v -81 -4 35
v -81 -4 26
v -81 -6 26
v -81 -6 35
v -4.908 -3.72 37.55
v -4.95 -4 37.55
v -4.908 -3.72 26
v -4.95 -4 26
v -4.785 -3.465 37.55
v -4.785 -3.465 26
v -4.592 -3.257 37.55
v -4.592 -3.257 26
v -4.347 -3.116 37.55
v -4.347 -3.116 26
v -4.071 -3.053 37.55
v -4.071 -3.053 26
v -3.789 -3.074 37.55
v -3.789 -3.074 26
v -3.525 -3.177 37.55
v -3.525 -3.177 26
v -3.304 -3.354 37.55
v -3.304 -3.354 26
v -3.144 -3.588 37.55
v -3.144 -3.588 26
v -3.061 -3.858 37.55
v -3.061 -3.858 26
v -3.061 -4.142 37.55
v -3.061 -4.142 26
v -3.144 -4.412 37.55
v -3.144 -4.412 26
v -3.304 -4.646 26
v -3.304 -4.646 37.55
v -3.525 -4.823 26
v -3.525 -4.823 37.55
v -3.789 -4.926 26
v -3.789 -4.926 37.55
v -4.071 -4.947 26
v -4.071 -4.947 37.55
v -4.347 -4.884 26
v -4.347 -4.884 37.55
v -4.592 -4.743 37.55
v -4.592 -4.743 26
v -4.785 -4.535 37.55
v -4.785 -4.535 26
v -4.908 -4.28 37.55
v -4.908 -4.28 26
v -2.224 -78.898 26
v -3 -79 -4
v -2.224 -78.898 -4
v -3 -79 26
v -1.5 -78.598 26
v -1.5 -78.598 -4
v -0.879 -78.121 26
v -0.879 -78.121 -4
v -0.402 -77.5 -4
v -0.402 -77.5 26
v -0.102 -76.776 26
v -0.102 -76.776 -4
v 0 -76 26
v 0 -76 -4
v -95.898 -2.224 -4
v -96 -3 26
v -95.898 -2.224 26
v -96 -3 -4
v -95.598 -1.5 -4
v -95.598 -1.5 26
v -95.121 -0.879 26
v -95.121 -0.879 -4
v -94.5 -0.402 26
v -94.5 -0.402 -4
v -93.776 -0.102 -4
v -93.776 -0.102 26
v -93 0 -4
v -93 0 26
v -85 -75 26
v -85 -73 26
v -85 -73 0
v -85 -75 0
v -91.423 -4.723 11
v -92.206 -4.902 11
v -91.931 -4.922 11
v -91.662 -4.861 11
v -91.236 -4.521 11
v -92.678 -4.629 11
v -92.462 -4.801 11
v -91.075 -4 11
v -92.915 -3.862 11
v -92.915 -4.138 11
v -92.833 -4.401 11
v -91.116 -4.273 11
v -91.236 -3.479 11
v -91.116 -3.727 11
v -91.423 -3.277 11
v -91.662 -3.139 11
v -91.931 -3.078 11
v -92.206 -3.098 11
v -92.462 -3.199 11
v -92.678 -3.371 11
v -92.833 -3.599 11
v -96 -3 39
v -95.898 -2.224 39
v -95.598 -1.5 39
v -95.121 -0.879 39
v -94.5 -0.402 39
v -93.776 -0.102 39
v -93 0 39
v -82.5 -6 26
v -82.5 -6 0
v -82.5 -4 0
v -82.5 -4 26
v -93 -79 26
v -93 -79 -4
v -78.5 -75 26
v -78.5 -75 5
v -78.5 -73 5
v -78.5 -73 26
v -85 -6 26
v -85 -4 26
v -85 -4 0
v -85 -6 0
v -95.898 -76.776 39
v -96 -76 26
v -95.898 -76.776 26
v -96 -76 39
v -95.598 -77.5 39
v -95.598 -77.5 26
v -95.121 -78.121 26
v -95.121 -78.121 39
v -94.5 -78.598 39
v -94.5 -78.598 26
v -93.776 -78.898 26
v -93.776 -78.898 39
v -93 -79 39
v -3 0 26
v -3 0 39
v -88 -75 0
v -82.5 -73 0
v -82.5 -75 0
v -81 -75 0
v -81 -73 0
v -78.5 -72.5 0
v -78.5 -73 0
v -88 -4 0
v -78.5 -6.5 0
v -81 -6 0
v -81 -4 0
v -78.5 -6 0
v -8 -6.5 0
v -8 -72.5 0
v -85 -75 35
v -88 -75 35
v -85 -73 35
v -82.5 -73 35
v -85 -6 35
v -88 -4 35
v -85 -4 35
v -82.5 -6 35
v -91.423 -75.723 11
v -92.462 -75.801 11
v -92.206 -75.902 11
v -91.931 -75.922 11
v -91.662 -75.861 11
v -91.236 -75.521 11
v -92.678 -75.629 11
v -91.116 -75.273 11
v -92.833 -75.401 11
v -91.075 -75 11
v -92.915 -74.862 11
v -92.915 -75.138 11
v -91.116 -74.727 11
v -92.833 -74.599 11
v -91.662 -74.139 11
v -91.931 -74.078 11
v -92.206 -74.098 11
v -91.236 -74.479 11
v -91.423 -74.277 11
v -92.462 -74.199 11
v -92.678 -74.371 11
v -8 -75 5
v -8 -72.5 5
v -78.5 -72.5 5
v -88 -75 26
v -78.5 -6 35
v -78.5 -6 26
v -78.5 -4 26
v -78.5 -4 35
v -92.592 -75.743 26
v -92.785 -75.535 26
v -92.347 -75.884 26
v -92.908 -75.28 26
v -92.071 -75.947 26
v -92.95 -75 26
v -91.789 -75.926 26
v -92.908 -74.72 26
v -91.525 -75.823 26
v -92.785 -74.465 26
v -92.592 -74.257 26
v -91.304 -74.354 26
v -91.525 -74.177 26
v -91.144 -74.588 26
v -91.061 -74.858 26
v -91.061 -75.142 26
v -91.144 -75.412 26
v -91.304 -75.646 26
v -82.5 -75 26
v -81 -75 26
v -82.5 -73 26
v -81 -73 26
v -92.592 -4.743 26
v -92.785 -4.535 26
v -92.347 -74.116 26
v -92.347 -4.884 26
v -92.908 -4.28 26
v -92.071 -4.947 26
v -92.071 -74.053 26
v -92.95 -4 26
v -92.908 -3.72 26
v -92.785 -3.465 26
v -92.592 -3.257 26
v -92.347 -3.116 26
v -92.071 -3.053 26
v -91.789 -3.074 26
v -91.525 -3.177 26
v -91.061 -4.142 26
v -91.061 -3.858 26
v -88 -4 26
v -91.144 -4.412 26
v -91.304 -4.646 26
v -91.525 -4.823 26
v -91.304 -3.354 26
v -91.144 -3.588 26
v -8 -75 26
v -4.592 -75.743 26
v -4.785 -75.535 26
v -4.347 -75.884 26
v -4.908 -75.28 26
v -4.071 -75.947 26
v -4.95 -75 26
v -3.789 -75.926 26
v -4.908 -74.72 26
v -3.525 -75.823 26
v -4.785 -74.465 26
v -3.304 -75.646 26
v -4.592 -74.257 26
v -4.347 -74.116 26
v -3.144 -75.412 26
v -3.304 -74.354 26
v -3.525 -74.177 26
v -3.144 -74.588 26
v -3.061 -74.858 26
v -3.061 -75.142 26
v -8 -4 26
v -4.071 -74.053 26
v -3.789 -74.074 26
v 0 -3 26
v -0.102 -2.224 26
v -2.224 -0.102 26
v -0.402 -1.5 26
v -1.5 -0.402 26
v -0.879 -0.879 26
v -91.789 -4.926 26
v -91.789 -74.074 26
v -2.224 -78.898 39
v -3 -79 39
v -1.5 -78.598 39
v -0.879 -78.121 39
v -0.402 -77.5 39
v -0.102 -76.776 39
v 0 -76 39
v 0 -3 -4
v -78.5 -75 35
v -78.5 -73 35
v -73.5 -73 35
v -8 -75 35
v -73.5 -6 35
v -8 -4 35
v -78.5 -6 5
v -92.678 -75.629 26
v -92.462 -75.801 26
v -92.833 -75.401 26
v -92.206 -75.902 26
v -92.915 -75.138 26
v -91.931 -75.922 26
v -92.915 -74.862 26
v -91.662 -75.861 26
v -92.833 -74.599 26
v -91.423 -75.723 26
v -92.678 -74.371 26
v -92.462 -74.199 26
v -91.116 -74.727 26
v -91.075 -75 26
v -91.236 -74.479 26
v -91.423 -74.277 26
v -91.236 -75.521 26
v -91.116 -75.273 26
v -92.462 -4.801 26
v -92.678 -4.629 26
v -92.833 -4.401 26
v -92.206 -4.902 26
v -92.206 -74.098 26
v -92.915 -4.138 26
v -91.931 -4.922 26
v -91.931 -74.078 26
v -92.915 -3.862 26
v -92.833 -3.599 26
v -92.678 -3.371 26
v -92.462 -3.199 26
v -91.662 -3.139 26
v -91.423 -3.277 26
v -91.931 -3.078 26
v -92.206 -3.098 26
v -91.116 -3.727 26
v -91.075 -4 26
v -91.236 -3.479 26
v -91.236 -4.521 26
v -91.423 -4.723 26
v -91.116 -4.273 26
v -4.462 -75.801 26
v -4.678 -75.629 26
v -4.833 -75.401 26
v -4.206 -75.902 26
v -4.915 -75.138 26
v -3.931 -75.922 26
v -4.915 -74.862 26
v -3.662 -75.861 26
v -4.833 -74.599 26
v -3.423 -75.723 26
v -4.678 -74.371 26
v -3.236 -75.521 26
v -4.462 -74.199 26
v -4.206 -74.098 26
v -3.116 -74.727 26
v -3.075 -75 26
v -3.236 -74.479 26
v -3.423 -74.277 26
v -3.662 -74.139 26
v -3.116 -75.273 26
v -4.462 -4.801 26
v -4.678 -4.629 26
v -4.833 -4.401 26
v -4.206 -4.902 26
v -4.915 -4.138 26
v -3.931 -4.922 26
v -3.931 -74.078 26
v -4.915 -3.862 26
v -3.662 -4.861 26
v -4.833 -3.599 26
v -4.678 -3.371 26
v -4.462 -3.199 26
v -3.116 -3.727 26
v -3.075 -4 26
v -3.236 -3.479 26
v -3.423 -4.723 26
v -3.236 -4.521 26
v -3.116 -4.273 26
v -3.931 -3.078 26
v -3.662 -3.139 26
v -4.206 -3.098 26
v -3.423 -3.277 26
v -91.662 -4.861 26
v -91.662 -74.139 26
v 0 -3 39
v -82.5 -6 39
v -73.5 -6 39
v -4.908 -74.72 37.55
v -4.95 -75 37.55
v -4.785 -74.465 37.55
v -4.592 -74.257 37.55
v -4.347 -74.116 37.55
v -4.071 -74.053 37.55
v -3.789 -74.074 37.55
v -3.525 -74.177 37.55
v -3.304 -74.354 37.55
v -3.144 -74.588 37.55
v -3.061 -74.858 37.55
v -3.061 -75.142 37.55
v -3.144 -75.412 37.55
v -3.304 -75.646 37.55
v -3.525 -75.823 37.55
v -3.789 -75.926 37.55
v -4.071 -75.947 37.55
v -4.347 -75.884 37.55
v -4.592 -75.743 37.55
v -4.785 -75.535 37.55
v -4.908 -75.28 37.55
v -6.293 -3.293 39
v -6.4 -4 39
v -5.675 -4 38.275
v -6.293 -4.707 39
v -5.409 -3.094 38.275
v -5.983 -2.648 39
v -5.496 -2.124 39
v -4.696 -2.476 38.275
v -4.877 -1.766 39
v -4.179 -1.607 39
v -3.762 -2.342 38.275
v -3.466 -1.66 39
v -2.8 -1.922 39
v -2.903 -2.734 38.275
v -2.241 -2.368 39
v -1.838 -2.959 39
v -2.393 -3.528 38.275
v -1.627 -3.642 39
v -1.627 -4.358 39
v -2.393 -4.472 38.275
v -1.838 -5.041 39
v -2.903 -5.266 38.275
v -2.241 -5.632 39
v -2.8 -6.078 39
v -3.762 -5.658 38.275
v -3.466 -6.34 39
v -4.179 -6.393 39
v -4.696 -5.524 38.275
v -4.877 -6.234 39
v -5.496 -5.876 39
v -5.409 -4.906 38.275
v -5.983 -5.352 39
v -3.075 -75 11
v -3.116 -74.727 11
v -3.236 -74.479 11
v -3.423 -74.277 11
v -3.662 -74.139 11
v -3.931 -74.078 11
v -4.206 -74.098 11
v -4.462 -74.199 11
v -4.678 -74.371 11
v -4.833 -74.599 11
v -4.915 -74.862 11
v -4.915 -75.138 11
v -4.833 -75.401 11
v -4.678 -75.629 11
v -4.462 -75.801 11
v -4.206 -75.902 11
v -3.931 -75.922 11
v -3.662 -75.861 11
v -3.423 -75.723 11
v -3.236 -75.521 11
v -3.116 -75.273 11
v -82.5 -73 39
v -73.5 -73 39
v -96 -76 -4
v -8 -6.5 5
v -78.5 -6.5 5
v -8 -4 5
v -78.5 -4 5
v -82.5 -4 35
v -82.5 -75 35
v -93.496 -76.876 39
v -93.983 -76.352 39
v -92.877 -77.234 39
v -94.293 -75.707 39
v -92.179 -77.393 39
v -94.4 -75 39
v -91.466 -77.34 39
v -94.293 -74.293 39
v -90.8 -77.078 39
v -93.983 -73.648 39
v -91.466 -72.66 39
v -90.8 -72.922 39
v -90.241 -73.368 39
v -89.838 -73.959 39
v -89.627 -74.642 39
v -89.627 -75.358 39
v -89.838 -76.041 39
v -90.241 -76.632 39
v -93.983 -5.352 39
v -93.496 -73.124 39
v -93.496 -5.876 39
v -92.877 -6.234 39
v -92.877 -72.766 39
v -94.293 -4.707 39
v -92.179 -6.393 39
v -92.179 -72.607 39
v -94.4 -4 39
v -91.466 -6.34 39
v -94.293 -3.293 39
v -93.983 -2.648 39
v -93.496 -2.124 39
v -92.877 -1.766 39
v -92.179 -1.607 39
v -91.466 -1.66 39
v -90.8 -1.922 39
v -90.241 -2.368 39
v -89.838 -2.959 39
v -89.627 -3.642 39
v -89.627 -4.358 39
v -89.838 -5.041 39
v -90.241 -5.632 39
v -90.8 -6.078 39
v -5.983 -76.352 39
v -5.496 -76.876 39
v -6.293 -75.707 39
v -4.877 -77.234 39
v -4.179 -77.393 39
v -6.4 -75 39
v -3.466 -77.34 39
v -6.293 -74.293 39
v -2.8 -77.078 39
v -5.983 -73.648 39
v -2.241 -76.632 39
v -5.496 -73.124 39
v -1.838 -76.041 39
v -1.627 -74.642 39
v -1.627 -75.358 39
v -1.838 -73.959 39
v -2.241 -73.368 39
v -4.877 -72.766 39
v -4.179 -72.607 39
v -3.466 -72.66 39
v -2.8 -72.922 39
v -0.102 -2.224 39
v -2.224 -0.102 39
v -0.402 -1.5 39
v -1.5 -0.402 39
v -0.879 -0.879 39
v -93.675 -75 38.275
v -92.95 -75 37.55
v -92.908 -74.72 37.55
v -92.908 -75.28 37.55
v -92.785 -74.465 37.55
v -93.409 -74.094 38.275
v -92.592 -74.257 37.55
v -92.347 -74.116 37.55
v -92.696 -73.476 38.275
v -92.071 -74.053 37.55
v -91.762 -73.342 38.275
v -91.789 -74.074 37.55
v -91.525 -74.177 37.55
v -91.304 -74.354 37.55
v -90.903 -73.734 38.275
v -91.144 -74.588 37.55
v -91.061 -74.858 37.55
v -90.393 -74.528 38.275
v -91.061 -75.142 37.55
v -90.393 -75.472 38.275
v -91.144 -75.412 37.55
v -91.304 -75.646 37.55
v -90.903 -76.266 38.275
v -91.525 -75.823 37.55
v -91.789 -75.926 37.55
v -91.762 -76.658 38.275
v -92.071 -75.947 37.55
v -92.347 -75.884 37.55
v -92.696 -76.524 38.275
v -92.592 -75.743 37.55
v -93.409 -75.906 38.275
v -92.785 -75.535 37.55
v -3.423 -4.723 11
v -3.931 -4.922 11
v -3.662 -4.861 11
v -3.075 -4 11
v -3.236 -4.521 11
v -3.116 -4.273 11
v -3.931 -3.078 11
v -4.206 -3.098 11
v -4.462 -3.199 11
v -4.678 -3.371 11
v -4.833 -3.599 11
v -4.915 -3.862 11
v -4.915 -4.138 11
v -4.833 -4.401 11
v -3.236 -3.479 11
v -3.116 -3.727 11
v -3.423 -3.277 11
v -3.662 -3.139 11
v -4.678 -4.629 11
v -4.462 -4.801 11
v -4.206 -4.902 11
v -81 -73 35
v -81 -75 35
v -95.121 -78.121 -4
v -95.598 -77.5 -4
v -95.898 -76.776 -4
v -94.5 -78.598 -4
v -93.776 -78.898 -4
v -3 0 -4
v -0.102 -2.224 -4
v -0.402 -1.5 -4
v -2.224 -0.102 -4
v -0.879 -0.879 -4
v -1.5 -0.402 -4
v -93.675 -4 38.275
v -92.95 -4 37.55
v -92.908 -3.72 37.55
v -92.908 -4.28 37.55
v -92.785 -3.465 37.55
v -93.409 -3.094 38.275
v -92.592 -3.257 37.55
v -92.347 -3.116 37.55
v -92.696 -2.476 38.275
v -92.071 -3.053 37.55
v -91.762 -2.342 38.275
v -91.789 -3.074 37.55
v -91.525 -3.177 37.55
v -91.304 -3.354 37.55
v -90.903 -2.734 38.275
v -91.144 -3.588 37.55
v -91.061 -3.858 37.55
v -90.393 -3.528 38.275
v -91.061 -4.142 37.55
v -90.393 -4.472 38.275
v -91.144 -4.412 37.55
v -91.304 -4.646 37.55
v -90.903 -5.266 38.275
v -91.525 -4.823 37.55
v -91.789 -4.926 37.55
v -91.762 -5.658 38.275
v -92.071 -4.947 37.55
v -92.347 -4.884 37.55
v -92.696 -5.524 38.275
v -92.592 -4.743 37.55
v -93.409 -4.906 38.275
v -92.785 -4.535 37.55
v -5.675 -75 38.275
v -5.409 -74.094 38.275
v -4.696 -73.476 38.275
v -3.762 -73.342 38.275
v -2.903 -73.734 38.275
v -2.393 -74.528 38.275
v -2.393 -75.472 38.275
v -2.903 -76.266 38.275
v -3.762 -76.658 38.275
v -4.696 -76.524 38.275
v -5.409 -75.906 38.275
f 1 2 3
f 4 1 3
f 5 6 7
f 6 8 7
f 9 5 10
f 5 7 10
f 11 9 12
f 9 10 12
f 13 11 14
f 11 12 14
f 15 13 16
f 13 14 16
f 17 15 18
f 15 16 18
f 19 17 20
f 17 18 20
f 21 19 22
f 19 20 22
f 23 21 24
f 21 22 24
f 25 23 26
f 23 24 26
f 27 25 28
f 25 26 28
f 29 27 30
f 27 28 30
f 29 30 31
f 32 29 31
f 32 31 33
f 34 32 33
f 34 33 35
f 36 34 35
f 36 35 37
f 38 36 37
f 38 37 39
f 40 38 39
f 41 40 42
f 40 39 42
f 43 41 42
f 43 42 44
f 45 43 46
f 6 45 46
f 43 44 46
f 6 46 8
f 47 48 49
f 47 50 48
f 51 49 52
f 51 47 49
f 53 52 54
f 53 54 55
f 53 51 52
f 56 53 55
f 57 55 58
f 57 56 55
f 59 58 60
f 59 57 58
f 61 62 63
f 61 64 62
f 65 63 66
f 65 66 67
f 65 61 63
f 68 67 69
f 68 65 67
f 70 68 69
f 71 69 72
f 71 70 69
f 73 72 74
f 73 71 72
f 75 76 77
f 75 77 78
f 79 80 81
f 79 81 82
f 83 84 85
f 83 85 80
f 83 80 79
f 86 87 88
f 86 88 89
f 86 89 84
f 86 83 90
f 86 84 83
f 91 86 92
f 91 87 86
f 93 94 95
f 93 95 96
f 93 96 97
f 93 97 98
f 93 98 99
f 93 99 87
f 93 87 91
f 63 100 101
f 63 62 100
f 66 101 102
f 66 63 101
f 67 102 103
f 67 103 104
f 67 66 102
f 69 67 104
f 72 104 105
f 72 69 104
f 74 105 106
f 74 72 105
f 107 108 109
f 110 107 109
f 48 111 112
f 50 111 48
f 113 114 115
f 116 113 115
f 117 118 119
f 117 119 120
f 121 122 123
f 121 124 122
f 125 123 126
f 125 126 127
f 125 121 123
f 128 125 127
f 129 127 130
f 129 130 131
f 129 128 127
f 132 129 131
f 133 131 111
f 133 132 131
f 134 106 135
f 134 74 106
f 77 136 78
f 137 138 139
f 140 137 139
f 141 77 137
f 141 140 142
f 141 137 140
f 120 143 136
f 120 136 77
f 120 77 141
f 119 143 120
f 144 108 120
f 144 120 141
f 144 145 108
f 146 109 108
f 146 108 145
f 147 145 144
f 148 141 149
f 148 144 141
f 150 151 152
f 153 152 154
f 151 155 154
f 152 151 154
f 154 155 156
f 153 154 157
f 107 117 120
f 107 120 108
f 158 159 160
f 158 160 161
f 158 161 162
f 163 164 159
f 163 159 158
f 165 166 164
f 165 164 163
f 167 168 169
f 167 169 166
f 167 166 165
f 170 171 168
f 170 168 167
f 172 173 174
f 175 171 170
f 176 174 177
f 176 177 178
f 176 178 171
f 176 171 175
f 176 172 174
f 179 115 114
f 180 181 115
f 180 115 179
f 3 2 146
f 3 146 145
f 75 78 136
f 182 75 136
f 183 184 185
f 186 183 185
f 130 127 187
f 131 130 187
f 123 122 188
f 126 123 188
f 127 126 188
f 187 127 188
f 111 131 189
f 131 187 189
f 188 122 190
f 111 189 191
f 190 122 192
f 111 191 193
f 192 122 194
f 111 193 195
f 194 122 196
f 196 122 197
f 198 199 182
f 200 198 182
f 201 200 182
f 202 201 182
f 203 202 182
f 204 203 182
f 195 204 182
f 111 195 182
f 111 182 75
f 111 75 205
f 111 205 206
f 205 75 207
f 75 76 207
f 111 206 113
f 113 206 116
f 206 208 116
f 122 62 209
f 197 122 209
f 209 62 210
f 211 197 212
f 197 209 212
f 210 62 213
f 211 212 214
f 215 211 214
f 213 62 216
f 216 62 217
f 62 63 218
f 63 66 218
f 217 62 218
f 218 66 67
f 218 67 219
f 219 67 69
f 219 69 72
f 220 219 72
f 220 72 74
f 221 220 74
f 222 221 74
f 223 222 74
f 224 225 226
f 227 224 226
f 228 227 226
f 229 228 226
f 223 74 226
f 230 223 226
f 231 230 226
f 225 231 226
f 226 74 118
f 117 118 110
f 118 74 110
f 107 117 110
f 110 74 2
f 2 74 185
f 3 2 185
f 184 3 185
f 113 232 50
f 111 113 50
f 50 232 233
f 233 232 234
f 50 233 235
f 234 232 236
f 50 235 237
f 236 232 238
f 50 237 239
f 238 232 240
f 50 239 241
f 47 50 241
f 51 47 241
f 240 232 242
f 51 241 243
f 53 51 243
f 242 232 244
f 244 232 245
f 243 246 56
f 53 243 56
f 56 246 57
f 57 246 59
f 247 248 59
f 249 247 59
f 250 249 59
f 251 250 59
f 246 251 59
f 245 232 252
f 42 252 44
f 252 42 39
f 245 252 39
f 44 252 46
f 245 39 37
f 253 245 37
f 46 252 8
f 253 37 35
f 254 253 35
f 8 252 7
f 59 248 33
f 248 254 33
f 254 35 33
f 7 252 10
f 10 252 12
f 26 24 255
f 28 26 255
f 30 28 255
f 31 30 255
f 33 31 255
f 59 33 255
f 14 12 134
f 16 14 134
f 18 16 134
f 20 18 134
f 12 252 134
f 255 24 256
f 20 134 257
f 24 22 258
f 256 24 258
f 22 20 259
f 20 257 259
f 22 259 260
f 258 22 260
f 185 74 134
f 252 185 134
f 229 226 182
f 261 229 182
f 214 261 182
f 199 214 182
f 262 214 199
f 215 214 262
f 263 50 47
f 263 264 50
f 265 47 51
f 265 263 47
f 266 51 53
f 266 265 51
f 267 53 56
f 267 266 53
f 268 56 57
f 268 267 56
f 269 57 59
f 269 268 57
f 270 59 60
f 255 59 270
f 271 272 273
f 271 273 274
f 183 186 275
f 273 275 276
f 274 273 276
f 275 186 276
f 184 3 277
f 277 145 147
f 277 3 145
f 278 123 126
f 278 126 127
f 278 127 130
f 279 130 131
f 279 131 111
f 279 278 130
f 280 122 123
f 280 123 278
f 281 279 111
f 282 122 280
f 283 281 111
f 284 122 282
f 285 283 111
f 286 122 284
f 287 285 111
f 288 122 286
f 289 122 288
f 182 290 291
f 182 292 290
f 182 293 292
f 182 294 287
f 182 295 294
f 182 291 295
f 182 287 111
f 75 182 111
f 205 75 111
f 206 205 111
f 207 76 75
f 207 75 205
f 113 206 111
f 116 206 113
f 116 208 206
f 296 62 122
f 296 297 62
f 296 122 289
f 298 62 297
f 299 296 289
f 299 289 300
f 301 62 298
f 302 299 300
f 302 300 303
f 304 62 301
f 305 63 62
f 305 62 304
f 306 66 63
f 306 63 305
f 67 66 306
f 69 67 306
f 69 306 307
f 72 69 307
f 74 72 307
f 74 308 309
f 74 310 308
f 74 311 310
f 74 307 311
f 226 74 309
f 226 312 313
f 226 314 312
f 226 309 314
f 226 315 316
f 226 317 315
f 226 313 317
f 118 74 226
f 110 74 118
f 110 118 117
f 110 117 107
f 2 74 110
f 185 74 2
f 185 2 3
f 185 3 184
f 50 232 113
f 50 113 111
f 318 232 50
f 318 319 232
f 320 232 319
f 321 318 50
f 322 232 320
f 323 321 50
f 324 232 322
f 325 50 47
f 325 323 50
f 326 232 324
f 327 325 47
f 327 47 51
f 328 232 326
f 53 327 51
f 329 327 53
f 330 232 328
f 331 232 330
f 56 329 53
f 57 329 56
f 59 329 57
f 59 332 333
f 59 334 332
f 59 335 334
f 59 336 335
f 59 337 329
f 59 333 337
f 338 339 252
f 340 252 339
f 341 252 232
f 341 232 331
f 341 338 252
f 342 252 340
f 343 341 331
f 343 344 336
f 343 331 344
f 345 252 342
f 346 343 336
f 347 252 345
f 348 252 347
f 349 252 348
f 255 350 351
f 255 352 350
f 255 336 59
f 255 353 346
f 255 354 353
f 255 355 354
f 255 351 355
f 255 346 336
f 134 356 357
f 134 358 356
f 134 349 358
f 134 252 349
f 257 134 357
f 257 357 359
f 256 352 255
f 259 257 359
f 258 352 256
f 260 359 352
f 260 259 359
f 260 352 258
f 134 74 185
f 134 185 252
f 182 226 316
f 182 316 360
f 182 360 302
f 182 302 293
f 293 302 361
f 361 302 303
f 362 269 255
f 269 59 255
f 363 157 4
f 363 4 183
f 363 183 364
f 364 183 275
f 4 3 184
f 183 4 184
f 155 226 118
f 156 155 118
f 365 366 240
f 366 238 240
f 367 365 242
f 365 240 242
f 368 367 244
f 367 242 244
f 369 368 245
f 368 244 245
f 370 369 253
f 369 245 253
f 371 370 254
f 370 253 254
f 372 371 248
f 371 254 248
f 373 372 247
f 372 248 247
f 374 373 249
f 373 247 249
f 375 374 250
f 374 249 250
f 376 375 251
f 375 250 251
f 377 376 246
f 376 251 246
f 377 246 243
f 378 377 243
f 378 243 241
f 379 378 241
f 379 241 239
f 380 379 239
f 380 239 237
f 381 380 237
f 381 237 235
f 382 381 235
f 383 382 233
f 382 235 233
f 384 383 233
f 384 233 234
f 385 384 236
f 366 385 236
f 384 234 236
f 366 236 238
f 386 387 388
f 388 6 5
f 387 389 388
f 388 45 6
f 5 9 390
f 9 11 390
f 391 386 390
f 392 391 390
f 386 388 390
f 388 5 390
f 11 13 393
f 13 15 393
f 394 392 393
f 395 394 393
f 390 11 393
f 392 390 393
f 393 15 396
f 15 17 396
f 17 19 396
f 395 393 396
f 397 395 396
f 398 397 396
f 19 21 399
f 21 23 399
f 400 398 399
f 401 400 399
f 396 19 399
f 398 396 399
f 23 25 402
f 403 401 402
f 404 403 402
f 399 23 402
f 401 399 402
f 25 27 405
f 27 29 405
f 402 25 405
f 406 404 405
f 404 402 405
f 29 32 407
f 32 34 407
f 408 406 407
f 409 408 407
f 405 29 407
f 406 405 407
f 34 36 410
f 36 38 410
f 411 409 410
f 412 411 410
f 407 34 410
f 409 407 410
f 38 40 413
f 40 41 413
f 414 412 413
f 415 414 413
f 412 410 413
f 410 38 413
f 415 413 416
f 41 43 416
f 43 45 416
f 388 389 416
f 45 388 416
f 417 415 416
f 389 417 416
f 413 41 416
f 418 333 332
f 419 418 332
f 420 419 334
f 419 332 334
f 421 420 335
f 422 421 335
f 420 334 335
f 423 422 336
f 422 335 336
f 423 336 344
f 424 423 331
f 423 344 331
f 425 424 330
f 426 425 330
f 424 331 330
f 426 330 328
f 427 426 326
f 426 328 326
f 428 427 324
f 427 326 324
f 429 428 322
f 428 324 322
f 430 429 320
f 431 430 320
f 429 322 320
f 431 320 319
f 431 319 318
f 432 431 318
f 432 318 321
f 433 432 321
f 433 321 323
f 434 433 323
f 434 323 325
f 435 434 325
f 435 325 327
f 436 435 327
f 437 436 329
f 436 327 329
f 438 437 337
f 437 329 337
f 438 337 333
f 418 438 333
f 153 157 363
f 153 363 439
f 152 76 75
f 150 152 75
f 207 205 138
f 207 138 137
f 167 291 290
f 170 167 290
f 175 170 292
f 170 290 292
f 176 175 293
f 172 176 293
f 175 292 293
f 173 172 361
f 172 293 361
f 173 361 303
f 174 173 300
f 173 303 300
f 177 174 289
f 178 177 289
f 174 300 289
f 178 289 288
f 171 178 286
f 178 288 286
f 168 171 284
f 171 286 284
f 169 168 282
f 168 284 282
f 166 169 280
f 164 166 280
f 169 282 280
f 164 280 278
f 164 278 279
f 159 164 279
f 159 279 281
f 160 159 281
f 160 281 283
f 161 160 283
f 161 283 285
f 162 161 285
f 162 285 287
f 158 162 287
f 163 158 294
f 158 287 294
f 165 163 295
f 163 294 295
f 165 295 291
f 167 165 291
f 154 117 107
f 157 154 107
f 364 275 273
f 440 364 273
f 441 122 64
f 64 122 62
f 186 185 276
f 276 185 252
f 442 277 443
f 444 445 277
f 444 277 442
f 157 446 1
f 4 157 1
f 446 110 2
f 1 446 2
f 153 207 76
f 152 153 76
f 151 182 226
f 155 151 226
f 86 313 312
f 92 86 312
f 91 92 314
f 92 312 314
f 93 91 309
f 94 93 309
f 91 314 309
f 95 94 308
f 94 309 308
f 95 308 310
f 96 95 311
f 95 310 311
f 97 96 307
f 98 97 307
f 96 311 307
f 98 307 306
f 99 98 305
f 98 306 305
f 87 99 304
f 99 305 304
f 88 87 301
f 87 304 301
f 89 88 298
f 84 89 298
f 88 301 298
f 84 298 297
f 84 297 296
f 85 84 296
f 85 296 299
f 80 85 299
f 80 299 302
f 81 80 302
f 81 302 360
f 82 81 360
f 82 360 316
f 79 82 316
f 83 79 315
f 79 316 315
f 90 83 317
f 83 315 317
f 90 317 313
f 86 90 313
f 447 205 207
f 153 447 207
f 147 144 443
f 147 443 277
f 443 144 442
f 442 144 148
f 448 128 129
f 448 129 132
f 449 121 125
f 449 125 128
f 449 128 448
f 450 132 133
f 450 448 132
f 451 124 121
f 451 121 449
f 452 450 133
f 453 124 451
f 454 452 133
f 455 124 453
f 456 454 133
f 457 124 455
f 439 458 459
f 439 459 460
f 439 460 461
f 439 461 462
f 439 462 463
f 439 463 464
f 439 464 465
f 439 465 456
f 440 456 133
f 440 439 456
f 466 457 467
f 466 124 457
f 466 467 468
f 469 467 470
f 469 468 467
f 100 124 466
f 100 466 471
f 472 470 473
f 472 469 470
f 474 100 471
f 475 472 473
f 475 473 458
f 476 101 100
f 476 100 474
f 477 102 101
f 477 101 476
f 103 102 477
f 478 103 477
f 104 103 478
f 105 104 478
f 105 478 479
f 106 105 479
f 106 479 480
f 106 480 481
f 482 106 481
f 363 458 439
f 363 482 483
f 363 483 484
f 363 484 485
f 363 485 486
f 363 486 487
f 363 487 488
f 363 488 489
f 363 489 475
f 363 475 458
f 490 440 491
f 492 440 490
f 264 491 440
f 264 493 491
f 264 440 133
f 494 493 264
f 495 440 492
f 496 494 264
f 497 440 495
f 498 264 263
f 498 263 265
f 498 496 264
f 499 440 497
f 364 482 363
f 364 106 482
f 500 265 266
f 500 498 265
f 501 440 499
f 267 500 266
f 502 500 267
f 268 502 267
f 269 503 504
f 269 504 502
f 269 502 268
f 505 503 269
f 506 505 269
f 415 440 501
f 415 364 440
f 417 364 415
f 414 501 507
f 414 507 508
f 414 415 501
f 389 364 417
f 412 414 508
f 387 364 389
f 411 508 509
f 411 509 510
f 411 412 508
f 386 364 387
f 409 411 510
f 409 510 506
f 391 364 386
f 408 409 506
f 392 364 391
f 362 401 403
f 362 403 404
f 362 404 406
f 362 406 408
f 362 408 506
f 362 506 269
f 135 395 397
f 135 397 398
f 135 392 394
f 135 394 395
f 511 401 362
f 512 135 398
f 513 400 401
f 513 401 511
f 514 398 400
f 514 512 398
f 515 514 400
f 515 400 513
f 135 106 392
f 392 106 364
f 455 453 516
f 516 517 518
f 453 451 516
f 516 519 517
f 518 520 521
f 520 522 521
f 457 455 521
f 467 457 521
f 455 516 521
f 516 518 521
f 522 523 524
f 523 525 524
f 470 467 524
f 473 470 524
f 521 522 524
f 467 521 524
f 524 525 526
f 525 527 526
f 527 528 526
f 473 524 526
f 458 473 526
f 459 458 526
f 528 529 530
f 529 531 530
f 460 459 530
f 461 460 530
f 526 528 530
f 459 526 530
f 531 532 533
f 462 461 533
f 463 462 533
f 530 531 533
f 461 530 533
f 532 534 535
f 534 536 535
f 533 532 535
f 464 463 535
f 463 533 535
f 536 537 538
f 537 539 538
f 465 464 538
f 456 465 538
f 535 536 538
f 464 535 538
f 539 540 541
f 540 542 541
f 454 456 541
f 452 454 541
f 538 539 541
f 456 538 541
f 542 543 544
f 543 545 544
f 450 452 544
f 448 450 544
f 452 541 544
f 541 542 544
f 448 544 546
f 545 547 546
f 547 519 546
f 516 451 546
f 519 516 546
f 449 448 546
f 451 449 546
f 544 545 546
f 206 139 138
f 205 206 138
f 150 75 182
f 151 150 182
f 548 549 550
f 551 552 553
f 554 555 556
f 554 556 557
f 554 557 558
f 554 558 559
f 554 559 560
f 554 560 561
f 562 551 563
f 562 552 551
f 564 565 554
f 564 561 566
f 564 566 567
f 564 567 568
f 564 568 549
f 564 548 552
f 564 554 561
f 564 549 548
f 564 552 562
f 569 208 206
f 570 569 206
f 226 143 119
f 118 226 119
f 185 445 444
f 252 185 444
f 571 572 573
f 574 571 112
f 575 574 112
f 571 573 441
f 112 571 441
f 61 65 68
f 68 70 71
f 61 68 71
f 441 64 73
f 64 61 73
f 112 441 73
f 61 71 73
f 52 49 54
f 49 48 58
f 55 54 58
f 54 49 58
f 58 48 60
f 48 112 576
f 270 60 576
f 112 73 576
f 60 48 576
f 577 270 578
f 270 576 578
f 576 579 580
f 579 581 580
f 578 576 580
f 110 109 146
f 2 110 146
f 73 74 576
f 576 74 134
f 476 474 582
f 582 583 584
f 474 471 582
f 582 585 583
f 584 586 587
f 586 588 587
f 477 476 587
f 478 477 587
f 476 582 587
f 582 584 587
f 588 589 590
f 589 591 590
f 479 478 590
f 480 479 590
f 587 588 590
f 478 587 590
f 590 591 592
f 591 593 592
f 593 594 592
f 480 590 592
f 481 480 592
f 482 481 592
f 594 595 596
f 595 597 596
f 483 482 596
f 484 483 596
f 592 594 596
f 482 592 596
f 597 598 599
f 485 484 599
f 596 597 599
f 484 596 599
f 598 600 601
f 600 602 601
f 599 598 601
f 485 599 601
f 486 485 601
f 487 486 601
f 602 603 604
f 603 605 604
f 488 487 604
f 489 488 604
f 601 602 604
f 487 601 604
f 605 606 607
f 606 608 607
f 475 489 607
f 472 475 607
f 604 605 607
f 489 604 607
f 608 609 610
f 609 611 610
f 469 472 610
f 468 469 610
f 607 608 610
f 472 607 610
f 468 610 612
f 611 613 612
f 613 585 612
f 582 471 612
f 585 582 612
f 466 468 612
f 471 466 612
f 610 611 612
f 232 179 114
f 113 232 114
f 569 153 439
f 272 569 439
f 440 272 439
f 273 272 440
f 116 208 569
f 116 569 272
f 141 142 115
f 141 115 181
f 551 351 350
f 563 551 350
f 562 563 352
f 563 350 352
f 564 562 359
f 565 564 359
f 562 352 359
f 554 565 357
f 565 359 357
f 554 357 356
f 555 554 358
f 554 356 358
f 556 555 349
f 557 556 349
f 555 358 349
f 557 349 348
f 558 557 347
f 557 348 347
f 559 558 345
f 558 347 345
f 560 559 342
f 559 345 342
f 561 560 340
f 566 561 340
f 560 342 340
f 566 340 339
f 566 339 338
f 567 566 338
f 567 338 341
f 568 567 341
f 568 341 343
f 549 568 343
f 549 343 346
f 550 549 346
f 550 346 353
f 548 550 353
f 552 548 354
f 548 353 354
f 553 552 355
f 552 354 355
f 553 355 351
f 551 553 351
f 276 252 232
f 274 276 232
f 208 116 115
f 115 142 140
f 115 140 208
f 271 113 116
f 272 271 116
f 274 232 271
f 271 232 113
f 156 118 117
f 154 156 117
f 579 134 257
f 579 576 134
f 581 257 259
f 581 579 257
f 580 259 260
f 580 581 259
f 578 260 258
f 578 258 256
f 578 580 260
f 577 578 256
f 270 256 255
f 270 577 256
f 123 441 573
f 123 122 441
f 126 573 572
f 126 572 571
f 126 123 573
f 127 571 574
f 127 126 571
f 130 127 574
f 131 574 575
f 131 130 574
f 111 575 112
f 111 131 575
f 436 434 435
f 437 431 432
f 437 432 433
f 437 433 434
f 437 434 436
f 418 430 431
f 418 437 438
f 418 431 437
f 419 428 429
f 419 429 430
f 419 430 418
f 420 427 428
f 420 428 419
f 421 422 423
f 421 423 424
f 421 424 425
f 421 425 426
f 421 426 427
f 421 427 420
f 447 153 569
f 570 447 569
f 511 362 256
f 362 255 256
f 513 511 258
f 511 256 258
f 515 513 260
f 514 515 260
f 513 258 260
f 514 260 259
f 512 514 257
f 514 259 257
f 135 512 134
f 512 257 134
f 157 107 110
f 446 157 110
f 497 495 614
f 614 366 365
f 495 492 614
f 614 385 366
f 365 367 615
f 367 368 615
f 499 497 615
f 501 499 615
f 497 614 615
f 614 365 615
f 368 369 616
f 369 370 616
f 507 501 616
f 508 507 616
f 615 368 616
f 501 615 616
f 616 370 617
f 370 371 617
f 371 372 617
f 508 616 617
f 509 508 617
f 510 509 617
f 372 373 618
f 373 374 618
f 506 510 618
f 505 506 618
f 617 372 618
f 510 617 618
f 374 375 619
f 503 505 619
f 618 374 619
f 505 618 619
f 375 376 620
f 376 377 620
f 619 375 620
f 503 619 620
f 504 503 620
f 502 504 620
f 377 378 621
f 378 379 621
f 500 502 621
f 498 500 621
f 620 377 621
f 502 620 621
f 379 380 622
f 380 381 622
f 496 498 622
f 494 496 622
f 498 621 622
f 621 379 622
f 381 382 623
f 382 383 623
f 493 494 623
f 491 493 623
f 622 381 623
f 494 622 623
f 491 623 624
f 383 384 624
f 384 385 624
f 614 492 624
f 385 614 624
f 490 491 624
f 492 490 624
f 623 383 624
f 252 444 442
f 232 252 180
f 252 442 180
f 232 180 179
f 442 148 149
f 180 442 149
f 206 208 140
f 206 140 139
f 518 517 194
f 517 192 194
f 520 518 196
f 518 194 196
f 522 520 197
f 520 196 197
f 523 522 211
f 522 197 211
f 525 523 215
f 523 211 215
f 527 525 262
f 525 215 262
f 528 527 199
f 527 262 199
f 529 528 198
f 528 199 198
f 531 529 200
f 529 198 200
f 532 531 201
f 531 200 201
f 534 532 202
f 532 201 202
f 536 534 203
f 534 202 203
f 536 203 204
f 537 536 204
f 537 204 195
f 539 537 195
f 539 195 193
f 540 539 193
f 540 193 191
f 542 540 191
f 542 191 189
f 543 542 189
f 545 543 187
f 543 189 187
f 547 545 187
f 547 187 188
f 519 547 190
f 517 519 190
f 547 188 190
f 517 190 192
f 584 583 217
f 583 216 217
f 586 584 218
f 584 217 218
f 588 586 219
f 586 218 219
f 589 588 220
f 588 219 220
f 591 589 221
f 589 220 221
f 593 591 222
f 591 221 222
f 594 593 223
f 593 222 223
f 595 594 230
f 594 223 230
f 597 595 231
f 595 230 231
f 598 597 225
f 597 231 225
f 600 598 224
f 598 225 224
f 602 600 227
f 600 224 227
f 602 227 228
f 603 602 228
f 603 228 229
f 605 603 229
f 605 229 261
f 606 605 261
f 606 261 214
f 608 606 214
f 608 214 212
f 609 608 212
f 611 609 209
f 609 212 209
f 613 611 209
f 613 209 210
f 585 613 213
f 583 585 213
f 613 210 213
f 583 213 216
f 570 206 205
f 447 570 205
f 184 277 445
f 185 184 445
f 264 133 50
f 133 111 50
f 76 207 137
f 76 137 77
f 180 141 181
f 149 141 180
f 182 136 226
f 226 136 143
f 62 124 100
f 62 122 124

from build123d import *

# Parameters (mm, degrees)
F0_W            = 96
F0_H            = 79
F1_DEPTH        = 26
F2_W            = 96
F2_H            = 79
F3_DEPTH        = 4
F4_W            = 70.5
F4_H            = 2.5
F5_DEPTH        = 5
F6_W            = 96
F6_H            = 79
F7_DEPTH        = 9
F8_W            = 96
F8_H            = 79
F9_DEPTH        = 4
F10_W           = 9
F10_H           = 67
F11_DEPTH       = 10
F12_R           = 0.925
F13_DEPTH       = 25
F15_D           = 1.9
F15_CSINK_D     = 4.8
F15_CSINK_ANGLE = 90
F16_DEPTH       = 15
F17_R           = 3
F17_2_R         = 3


with BuildPart() as f1:
    # F0 (on Top) → F1 (new body)
    with BuildSketch(Plane.XY):
        with Locations((-48, -39.5)):
            Rectangle(F0_W, F0_H)
        Polygon((-88, -75), (-88, -4), (-85, -4), (-85, -6), (-82.5, -6), (-82.5, -4), (-81, -4), (-81, -6), (-78.5, -6), (-78.5, -4), (-8, -4), (-8, -75), (-78.5, -75), (-78.5, -73), (-81, -73), (-81, -75), (-82.5, -75), (-82.5, -73), (-85, -73), (-85, -75), align=None, mode=Mode.SUBTRACT)
    extrude(amount=F1_DEPTH)

    # F2 (on Top) → F3 (join)
    with BuildSketch(Plane.XY):
        with Locations((-48, -39.5)):
            Rectangle(F2_W, F2_H)
    extrude(amount=-F3_DEPTH)

    # F4 (on Top) → F5 (join)
    with BuildSketch(Plane.XY):
        with Locations((-43.25, -5.25)):
            Rectangle(F4_W, F4_H)
        with Locations((-43.25, -73.75)):
            Rectangle(F4_W, F4_H)
    extrude(amount=F5_DEPTH)

    # F12 (on face) → F16 (cut)
    with BuildSketch(Plane.XY.offset(26)):
        with Locations((-92, -4)):
            Circle(F12_R)
        with Locations((-4, -4)):
            Circle(F12_R)
        with Locations((-4, -75)):
            Circle(F12_R)
        with Locations((-92, -75)):
            Circle(F12_R)
    extrude(amount=-F16_DEPTH, mode=Mode.SUBTRACT)

    # F17
    f17_edges = [f1.edges().sort_by_distance(p)[0] for p in [
        (0, -79, 11),
        (-96, -79, 11),
        (0, 0, 11),
        (-96, 0, 11),
    ]]
    fillet(f17_edges, radius=F17_R)


with BuildPart() as f7:
    # F6 (on face) → F7 (new body)
    with BuildSketch(Plane.XY.offset(26)):
        with Locations((-48, -39.5)):
            Rectangle(F6_W, F6_H)
        Polygon((-88, -75), (-88, -4), (-85, -4), (-85, -6), (-82.5, -6), (-82.5, -4), (-81, -4), (-81, -6), (-78.5, -6), (-78.5, -4), (-8, -4), (-8, -75), (-78.5, -75), (-78.5, -73), (-81, -73), (-81, -75), (-82.5, -75), (-82.5, -73), (-85, -73), (-85, -75), align=None, mode=Mode.SUBTRACT)
    extrude(amount=F7_DEPTH)

    # F8 (on face) → F9 (join)
    with BuildSketch(Plane.XY.offset(35)):
        with Locations((-48, -39.5)):
            Rectangle(F8_W, F8_H)
    extrude(amount=F9_DEPTH)

    # F10 (on face) → F11 (cut)
    with BuildSketch(Plane(origin=(0, 0, 35), x_dir=(1, 0, 0), z_dir=(0, 0, -1))):
        with Locations((-78, 39.5)):
            Rectangle(F10_W, F10_H)
    extrude(amount=-F11_DEPTH, mode=Mode.SUBTRACT)

    # F12 (on face) → F13 (cut)
    with BuildSketch(Plane.XY.offset(26)):
        with Locations((-92, -4)):
            Circle(F12_R)
        with Locations((-4, -4)):
            Circle(F12_R)
        with Locations((-4, -75)):
            Circle(F12_R)
        with Locations((-92, -75)):
            Circle(F12_R)
    extrude(amount=F13_DEPTH, mode=Mode.SUBTRACT)

    # F15 (through all)
    with Locations(Plane.XY.offset(39)):
        with Locations((-92, -4), (-92, -75), (-4, -75), (-4, -4)):
            CounterSinkHole(F15_D / 2, F15_CSINK_D / 2, counter_sink_angle=F15_CSINK_ANGLE)

    # F17#2
    f17_2_edges = [f7.edges().sort_by_distance(p)[0] for p in [
        (0, -79, 32.5),
        (-96, -79, 32.5),
        (0, 0, 32.5),
        (-96, 0, 32.5),
    ]]
    fillet(f17_2_edges, radius=F17_2_R)


solid = Compound([f1.part, f7.part])
